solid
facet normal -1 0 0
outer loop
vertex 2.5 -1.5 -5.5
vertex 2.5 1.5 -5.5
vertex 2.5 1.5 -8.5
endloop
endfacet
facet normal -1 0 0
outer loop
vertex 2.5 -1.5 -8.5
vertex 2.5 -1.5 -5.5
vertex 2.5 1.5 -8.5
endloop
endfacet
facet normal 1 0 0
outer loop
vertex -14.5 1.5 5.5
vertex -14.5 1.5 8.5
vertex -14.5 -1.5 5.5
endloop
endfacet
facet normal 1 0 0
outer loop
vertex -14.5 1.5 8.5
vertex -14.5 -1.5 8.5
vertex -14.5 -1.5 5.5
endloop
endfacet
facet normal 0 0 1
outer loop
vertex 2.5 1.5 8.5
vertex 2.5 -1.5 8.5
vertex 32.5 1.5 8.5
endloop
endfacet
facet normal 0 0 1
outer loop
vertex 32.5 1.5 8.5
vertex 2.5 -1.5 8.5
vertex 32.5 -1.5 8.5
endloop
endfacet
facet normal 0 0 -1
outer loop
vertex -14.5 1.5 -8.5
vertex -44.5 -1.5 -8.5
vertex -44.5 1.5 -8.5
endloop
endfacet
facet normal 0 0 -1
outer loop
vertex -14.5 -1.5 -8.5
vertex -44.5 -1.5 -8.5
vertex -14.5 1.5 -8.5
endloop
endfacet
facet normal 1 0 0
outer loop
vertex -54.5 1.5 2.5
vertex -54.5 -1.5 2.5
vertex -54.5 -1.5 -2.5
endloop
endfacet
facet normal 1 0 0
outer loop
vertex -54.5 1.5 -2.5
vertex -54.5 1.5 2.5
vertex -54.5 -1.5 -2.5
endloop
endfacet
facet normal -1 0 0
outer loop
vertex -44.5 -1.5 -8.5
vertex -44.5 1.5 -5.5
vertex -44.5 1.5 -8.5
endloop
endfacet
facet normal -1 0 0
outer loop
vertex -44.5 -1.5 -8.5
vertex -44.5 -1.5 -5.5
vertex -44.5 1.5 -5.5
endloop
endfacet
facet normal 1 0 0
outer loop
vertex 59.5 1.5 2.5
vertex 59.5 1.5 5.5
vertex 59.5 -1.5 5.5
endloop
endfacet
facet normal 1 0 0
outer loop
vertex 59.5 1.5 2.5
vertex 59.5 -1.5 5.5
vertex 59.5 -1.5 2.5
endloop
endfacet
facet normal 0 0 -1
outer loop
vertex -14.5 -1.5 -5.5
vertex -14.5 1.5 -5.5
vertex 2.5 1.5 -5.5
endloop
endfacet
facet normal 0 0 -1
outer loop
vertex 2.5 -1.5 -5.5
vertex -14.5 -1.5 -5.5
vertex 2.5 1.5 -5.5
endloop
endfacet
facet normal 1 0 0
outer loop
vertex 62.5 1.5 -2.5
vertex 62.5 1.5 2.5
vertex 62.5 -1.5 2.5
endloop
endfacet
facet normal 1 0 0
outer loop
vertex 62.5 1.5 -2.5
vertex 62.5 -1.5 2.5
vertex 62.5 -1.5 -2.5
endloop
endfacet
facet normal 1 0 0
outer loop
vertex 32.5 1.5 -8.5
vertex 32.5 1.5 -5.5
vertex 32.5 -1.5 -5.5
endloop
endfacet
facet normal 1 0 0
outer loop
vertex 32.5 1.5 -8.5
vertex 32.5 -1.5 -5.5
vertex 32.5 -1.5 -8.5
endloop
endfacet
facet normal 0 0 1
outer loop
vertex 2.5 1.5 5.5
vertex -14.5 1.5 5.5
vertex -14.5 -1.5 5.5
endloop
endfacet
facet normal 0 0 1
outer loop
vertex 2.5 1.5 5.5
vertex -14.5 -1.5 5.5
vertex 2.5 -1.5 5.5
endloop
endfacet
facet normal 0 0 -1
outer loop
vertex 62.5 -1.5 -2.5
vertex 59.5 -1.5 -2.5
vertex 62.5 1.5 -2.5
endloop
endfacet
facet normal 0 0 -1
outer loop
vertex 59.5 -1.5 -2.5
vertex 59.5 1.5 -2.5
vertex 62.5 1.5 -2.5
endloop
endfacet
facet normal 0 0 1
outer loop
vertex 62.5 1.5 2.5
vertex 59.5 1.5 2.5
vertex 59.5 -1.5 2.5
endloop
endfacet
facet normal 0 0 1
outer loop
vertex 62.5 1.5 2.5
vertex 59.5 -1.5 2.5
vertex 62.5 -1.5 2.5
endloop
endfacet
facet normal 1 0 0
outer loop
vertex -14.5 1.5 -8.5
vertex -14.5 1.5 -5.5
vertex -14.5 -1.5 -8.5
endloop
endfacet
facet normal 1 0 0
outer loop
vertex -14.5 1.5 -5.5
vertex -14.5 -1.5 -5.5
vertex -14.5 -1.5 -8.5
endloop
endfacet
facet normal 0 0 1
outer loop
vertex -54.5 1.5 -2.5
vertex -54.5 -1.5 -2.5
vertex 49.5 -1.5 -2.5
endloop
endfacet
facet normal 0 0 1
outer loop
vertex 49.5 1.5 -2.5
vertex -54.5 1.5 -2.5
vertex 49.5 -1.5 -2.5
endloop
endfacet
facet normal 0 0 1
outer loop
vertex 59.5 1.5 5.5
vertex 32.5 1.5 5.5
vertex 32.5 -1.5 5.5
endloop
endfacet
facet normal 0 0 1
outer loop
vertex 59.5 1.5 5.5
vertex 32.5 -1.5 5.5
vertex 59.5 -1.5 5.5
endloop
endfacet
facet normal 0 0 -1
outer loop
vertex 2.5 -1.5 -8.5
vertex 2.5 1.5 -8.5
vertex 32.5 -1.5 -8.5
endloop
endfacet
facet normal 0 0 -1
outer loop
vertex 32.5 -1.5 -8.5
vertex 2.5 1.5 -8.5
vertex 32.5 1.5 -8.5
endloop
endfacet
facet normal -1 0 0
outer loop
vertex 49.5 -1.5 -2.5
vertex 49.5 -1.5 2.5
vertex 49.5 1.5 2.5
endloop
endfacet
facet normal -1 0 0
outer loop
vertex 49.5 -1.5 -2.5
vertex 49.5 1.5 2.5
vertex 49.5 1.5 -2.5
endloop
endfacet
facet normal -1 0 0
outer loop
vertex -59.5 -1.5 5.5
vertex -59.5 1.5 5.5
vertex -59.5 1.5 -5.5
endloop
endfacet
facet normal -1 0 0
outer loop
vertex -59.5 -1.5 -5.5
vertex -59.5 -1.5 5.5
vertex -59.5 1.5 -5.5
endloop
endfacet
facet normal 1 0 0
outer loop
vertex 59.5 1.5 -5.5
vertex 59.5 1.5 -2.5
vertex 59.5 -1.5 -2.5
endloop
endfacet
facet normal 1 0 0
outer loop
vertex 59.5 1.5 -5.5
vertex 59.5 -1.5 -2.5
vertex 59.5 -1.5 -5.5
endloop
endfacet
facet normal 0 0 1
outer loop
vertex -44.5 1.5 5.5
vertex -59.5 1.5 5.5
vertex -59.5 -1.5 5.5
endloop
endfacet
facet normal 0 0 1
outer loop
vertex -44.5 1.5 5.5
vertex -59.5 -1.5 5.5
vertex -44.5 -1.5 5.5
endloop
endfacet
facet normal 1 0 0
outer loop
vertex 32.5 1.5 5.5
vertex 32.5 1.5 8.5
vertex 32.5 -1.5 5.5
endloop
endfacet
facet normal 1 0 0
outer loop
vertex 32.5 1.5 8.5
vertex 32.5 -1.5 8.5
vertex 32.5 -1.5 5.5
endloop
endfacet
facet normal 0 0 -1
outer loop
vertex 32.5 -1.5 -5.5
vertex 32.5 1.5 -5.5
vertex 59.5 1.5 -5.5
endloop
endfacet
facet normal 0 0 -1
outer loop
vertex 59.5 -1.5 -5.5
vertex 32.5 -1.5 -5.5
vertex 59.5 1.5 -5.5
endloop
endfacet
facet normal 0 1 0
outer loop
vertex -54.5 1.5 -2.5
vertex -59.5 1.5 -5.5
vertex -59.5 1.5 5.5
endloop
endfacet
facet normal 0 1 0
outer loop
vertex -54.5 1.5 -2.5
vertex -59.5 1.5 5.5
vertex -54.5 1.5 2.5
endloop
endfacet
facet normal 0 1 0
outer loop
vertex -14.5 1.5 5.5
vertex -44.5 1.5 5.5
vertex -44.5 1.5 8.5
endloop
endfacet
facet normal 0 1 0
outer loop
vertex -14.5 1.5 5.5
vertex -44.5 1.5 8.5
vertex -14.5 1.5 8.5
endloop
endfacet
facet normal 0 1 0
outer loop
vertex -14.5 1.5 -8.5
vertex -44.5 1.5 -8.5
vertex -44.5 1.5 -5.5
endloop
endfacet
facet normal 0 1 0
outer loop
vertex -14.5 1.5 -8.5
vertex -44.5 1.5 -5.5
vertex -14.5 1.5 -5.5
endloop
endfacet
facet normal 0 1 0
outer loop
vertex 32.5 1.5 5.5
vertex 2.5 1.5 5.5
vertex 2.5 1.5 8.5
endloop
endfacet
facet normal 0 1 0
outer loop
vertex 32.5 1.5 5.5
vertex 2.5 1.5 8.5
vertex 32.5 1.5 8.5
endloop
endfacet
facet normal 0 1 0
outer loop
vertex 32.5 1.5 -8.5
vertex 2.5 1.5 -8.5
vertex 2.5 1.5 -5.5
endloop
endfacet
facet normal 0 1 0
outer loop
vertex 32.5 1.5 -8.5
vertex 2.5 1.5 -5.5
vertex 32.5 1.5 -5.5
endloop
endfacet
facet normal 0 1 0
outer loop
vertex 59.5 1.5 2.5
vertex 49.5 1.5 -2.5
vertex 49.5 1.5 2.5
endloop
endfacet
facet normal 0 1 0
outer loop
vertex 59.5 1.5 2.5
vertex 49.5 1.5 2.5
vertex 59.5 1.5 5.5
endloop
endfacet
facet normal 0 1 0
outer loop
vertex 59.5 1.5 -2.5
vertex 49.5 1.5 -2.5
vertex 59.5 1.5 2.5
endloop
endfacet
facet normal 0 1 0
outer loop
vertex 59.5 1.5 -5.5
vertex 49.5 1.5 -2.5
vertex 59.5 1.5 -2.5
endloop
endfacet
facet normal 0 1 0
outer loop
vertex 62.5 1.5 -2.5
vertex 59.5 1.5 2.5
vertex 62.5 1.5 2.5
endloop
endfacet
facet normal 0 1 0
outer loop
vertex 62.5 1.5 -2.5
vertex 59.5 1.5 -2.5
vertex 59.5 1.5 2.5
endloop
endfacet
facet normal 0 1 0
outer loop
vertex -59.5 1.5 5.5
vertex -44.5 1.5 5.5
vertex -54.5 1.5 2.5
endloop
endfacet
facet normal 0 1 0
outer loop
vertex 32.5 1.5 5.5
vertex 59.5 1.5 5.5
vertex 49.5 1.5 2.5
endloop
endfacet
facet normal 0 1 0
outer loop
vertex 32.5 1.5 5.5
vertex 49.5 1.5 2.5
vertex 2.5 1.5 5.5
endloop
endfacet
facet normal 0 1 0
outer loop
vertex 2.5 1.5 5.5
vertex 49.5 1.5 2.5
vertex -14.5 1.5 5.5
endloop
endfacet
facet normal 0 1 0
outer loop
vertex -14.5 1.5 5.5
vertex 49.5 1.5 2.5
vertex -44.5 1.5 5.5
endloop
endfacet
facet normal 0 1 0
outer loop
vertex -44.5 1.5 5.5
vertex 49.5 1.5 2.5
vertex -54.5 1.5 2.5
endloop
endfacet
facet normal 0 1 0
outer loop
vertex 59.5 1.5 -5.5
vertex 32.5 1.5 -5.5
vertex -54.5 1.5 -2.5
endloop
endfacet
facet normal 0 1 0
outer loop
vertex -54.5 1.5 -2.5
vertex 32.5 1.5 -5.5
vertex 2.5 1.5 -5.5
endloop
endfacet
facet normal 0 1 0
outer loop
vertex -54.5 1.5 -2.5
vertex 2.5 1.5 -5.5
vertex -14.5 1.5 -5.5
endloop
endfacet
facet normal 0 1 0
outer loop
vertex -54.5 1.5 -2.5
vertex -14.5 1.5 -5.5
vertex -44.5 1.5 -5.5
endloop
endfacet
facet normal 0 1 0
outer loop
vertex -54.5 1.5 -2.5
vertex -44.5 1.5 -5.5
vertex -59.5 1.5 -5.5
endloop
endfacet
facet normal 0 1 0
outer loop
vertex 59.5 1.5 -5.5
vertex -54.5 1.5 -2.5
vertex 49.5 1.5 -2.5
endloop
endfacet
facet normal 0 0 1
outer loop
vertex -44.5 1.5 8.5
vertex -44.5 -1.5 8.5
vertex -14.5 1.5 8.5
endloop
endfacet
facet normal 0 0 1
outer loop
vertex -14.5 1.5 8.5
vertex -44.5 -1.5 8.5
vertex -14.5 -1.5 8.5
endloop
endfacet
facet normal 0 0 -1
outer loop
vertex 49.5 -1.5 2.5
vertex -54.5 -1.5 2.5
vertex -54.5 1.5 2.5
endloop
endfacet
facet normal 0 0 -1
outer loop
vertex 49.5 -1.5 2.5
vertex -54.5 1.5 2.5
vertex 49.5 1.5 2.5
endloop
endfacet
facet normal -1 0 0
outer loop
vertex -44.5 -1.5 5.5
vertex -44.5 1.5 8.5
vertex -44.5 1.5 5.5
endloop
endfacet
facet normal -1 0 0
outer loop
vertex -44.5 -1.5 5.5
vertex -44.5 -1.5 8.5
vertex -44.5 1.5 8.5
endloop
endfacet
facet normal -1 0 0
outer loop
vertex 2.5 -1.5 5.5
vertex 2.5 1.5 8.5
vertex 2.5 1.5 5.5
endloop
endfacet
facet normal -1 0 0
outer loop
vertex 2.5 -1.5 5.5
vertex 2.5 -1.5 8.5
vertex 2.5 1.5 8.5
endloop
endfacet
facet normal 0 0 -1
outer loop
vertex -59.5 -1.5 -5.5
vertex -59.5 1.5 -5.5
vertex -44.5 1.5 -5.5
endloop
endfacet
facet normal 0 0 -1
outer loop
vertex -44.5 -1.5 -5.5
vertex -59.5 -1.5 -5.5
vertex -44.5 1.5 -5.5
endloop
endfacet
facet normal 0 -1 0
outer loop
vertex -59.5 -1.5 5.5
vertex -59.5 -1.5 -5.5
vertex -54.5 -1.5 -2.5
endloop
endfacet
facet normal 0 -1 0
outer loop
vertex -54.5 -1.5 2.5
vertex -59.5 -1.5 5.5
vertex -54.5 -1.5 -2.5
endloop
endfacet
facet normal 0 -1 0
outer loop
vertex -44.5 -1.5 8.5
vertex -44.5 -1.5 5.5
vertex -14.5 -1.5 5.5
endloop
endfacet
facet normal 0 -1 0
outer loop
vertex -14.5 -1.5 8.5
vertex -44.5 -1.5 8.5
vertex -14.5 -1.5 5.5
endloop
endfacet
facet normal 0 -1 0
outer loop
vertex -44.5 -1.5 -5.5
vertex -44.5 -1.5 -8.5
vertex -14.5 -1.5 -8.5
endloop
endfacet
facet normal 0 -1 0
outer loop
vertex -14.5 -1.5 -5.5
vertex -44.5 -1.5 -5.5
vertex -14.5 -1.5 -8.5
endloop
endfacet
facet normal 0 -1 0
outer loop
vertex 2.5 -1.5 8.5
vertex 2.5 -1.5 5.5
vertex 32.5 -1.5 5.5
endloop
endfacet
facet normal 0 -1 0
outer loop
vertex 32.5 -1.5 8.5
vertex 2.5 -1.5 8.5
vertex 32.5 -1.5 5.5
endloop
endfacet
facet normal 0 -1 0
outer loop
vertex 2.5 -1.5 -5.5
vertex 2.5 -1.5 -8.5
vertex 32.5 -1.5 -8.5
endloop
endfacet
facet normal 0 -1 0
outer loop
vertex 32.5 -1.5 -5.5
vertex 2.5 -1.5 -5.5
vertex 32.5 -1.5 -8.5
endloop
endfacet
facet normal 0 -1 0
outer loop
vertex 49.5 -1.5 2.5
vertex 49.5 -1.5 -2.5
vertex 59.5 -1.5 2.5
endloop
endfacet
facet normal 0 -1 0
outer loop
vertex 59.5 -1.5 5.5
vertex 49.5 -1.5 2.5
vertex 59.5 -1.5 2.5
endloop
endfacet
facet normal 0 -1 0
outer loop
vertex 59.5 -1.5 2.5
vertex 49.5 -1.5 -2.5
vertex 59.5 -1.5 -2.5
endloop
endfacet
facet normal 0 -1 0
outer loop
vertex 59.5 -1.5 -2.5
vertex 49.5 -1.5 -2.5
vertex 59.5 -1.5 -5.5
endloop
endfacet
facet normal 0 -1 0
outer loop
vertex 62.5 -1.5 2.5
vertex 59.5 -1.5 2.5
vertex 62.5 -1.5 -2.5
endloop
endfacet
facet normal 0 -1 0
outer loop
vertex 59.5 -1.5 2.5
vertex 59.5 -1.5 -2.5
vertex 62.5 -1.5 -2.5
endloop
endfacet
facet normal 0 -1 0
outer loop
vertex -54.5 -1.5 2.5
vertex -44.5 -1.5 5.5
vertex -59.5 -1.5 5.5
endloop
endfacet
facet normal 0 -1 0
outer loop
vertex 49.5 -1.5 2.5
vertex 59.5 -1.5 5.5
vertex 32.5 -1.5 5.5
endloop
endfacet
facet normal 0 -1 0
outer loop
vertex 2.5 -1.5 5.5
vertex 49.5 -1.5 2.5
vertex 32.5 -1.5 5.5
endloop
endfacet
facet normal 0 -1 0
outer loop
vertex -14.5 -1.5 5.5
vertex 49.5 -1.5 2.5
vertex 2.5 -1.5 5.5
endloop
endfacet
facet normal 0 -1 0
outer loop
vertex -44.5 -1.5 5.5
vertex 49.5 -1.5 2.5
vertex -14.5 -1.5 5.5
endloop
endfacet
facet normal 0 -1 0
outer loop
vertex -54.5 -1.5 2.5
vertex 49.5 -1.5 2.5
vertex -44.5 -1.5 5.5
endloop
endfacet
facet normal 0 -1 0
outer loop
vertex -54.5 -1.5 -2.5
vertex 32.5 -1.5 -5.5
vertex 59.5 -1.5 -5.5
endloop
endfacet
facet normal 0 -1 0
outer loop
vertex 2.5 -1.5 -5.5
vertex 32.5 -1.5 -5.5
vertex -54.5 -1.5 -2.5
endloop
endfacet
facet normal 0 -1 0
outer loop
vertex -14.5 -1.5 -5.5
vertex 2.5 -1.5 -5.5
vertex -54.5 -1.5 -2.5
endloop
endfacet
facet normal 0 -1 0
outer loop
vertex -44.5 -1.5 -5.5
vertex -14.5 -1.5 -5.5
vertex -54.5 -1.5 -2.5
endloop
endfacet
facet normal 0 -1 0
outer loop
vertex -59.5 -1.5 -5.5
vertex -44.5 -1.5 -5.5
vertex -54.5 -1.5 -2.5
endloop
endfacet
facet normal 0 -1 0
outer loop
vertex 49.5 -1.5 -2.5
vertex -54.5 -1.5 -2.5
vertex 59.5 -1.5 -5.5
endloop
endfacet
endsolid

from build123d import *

# Parameters (mm, degrees)
SKETCH1_W               = 119
SKETCH1_H               = 11
BOSS_EXTRUDE1_DEPTH     = 1.5
SKETCH2_W               = 30
SKETCH2_H               = 3
BOSS_EXTRUDE2_DEPTH     = 1.5
CUT_EXTRUDE1_DEPTH      = 61.12279102
CUT_EXTRUDE1_DEPTH_BACK = 61.12279102
SKETCH3_W               = 104
SKETCH3_H               = 5
SKETCH4_W               = 3
SKETCH4_H               = 5
BOSS_EXTRUDE3_DEPTH     = 1.5


with BuildPart() as part:
    # Sketch1 → Boss-Extrude1 (new, symmetric)
    with BuildSketch(Plane(origin=(0, 0, 0), x_dir=(1, 0, 0), z_dir=(0, 1, 0))):
        Rectangle(SKETCH1_W, SKETCH1_H)
    extrude(amount=BOSS_EXTRUDE1_DEPTH, both=True)

    # Sketch2 → Boss-Extrude2 (add, symmetric)
    with BuildSketch(Plane(origin=(0, 0, 0), x_dir=(1, 0, 0), z_dir=(0, 1, 0))):
        with Locations((-29.5, -7)):
            Rectangle(SKETCH2_W, SKETCH2_H)
        with Locations((-29.5, 7)):
            Rectangle(SKETCH2_W, SKETCH2_H)
        with Locations((17.5, -7)):
            Rectangle(SKETCH2_W, SKETCH2_H)
        with Locations((17.5, 7)):
            Rectangle(SKETCH2_W, SKETCH2_H)
    extrude(amount=BOSS_EXTRUDE2_DEPTH, both=True)

    # Sketch3 → Cut-Extrude1 (cut, two sides: drawn at the far end of the back side and taken through both)
    with BuildSketch(Plane(origin=(0, 0, 0), x_dir=(1, 0, 0), z_dir=(0, 1, 0)).offset(-CUT_EXTRUDE1_DEPTH_BACK)):
        with Locations((-2.5, 0)):
            Rectangle(SKETCH3_W, SKETCH3_H)
    extrude(amount=CUT_EXTRUDE1_DEPTH + CUT_EXTRUDE1_DEPTH_BACK, mode=Mode.SUBTRACT)

    # Sketch4 → Boss-Extrude3 (add, symmetric)
    with BuildSketch(Plane(origin=(0, 0, 0), x_dir=(1, 0, 0), z_dir=(0, 1, 0))):
        with Locations((61, 0)):
            Rectangle(SKETCH4_W, SKETCH4_H)
    extrude(amount=BOSS_EXTRUDE3_DEPTH, both=True)


solid = part.part
